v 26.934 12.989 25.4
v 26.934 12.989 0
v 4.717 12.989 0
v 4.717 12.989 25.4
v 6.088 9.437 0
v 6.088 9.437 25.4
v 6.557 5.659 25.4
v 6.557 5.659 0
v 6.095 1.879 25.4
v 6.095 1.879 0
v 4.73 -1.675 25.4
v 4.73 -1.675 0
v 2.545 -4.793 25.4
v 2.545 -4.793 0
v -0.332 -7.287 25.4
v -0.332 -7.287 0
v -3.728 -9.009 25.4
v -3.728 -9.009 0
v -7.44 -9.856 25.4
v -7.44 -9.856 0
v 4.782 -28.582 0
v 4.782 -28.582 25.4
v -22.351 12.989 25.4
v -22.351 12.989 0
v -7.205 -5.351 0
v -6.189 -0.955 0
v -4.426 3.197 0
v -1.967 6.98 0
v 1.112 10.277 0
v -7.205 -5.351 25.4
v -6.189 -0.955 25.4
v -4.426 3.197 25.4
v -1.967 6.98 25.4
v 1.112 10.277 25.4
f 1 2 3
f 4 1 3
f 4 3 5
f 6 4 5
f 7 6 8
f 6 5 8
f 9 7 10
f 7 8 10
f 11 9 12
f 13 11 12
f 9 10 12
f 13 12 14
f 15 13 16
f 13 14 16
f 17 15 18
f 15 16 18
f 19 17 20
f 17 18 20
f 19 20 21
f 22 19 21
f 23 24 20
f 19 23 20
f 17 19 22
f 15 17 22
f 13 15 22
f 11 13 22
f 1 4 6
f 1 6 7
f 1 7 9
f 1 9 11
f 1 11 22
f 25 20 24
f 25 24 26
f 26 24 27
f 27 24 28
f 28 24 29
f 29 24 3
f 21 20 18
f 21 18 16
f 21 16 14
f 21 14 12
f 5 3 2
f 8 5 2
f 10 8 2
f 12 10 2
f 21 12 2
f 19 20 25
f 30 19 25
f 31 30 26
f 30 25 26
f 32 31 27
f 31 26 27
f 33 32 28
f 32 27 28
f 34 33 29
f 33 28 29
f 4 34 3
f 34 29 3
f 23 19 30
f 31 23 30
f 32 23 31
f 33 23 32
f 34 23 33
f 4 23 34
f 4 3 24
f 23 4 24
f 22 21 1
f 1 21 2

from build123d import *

# Parameters (mm, degrees)
F1_DEPTH = 25.4


with BuildPart() as f1:
    # F0 (on Top) → F1 (new body)
    with BuildSketch(Plane.XY):
        with BuildLine():
            Line((4.716561, 12.989431), (-22.350902, 12.989431))
            Line((-22.350902, 12.989431), (-7.440215, -9.855957))
            ThreePointArc((-7.440215, -9.855957), (-4.42572, 3.197134), (4.716561, 12.989431))
        make_face()
        with BuildLine():
            ThreePointArc((4.716561, 12.989431), (4.730457, -1.675166), (-7.440215, -9.855957))
            Line((-7.440215, -9.855957), (4.781897, -28.58205))
            Line((4.781897, -28.58205), (26.933659, 12.989431))
            Line((26.933659, 12.989431), (4.716561, 12.989431))
        make_face()
    extrude(amount=F1_DEPTH)


solid = f1.part
